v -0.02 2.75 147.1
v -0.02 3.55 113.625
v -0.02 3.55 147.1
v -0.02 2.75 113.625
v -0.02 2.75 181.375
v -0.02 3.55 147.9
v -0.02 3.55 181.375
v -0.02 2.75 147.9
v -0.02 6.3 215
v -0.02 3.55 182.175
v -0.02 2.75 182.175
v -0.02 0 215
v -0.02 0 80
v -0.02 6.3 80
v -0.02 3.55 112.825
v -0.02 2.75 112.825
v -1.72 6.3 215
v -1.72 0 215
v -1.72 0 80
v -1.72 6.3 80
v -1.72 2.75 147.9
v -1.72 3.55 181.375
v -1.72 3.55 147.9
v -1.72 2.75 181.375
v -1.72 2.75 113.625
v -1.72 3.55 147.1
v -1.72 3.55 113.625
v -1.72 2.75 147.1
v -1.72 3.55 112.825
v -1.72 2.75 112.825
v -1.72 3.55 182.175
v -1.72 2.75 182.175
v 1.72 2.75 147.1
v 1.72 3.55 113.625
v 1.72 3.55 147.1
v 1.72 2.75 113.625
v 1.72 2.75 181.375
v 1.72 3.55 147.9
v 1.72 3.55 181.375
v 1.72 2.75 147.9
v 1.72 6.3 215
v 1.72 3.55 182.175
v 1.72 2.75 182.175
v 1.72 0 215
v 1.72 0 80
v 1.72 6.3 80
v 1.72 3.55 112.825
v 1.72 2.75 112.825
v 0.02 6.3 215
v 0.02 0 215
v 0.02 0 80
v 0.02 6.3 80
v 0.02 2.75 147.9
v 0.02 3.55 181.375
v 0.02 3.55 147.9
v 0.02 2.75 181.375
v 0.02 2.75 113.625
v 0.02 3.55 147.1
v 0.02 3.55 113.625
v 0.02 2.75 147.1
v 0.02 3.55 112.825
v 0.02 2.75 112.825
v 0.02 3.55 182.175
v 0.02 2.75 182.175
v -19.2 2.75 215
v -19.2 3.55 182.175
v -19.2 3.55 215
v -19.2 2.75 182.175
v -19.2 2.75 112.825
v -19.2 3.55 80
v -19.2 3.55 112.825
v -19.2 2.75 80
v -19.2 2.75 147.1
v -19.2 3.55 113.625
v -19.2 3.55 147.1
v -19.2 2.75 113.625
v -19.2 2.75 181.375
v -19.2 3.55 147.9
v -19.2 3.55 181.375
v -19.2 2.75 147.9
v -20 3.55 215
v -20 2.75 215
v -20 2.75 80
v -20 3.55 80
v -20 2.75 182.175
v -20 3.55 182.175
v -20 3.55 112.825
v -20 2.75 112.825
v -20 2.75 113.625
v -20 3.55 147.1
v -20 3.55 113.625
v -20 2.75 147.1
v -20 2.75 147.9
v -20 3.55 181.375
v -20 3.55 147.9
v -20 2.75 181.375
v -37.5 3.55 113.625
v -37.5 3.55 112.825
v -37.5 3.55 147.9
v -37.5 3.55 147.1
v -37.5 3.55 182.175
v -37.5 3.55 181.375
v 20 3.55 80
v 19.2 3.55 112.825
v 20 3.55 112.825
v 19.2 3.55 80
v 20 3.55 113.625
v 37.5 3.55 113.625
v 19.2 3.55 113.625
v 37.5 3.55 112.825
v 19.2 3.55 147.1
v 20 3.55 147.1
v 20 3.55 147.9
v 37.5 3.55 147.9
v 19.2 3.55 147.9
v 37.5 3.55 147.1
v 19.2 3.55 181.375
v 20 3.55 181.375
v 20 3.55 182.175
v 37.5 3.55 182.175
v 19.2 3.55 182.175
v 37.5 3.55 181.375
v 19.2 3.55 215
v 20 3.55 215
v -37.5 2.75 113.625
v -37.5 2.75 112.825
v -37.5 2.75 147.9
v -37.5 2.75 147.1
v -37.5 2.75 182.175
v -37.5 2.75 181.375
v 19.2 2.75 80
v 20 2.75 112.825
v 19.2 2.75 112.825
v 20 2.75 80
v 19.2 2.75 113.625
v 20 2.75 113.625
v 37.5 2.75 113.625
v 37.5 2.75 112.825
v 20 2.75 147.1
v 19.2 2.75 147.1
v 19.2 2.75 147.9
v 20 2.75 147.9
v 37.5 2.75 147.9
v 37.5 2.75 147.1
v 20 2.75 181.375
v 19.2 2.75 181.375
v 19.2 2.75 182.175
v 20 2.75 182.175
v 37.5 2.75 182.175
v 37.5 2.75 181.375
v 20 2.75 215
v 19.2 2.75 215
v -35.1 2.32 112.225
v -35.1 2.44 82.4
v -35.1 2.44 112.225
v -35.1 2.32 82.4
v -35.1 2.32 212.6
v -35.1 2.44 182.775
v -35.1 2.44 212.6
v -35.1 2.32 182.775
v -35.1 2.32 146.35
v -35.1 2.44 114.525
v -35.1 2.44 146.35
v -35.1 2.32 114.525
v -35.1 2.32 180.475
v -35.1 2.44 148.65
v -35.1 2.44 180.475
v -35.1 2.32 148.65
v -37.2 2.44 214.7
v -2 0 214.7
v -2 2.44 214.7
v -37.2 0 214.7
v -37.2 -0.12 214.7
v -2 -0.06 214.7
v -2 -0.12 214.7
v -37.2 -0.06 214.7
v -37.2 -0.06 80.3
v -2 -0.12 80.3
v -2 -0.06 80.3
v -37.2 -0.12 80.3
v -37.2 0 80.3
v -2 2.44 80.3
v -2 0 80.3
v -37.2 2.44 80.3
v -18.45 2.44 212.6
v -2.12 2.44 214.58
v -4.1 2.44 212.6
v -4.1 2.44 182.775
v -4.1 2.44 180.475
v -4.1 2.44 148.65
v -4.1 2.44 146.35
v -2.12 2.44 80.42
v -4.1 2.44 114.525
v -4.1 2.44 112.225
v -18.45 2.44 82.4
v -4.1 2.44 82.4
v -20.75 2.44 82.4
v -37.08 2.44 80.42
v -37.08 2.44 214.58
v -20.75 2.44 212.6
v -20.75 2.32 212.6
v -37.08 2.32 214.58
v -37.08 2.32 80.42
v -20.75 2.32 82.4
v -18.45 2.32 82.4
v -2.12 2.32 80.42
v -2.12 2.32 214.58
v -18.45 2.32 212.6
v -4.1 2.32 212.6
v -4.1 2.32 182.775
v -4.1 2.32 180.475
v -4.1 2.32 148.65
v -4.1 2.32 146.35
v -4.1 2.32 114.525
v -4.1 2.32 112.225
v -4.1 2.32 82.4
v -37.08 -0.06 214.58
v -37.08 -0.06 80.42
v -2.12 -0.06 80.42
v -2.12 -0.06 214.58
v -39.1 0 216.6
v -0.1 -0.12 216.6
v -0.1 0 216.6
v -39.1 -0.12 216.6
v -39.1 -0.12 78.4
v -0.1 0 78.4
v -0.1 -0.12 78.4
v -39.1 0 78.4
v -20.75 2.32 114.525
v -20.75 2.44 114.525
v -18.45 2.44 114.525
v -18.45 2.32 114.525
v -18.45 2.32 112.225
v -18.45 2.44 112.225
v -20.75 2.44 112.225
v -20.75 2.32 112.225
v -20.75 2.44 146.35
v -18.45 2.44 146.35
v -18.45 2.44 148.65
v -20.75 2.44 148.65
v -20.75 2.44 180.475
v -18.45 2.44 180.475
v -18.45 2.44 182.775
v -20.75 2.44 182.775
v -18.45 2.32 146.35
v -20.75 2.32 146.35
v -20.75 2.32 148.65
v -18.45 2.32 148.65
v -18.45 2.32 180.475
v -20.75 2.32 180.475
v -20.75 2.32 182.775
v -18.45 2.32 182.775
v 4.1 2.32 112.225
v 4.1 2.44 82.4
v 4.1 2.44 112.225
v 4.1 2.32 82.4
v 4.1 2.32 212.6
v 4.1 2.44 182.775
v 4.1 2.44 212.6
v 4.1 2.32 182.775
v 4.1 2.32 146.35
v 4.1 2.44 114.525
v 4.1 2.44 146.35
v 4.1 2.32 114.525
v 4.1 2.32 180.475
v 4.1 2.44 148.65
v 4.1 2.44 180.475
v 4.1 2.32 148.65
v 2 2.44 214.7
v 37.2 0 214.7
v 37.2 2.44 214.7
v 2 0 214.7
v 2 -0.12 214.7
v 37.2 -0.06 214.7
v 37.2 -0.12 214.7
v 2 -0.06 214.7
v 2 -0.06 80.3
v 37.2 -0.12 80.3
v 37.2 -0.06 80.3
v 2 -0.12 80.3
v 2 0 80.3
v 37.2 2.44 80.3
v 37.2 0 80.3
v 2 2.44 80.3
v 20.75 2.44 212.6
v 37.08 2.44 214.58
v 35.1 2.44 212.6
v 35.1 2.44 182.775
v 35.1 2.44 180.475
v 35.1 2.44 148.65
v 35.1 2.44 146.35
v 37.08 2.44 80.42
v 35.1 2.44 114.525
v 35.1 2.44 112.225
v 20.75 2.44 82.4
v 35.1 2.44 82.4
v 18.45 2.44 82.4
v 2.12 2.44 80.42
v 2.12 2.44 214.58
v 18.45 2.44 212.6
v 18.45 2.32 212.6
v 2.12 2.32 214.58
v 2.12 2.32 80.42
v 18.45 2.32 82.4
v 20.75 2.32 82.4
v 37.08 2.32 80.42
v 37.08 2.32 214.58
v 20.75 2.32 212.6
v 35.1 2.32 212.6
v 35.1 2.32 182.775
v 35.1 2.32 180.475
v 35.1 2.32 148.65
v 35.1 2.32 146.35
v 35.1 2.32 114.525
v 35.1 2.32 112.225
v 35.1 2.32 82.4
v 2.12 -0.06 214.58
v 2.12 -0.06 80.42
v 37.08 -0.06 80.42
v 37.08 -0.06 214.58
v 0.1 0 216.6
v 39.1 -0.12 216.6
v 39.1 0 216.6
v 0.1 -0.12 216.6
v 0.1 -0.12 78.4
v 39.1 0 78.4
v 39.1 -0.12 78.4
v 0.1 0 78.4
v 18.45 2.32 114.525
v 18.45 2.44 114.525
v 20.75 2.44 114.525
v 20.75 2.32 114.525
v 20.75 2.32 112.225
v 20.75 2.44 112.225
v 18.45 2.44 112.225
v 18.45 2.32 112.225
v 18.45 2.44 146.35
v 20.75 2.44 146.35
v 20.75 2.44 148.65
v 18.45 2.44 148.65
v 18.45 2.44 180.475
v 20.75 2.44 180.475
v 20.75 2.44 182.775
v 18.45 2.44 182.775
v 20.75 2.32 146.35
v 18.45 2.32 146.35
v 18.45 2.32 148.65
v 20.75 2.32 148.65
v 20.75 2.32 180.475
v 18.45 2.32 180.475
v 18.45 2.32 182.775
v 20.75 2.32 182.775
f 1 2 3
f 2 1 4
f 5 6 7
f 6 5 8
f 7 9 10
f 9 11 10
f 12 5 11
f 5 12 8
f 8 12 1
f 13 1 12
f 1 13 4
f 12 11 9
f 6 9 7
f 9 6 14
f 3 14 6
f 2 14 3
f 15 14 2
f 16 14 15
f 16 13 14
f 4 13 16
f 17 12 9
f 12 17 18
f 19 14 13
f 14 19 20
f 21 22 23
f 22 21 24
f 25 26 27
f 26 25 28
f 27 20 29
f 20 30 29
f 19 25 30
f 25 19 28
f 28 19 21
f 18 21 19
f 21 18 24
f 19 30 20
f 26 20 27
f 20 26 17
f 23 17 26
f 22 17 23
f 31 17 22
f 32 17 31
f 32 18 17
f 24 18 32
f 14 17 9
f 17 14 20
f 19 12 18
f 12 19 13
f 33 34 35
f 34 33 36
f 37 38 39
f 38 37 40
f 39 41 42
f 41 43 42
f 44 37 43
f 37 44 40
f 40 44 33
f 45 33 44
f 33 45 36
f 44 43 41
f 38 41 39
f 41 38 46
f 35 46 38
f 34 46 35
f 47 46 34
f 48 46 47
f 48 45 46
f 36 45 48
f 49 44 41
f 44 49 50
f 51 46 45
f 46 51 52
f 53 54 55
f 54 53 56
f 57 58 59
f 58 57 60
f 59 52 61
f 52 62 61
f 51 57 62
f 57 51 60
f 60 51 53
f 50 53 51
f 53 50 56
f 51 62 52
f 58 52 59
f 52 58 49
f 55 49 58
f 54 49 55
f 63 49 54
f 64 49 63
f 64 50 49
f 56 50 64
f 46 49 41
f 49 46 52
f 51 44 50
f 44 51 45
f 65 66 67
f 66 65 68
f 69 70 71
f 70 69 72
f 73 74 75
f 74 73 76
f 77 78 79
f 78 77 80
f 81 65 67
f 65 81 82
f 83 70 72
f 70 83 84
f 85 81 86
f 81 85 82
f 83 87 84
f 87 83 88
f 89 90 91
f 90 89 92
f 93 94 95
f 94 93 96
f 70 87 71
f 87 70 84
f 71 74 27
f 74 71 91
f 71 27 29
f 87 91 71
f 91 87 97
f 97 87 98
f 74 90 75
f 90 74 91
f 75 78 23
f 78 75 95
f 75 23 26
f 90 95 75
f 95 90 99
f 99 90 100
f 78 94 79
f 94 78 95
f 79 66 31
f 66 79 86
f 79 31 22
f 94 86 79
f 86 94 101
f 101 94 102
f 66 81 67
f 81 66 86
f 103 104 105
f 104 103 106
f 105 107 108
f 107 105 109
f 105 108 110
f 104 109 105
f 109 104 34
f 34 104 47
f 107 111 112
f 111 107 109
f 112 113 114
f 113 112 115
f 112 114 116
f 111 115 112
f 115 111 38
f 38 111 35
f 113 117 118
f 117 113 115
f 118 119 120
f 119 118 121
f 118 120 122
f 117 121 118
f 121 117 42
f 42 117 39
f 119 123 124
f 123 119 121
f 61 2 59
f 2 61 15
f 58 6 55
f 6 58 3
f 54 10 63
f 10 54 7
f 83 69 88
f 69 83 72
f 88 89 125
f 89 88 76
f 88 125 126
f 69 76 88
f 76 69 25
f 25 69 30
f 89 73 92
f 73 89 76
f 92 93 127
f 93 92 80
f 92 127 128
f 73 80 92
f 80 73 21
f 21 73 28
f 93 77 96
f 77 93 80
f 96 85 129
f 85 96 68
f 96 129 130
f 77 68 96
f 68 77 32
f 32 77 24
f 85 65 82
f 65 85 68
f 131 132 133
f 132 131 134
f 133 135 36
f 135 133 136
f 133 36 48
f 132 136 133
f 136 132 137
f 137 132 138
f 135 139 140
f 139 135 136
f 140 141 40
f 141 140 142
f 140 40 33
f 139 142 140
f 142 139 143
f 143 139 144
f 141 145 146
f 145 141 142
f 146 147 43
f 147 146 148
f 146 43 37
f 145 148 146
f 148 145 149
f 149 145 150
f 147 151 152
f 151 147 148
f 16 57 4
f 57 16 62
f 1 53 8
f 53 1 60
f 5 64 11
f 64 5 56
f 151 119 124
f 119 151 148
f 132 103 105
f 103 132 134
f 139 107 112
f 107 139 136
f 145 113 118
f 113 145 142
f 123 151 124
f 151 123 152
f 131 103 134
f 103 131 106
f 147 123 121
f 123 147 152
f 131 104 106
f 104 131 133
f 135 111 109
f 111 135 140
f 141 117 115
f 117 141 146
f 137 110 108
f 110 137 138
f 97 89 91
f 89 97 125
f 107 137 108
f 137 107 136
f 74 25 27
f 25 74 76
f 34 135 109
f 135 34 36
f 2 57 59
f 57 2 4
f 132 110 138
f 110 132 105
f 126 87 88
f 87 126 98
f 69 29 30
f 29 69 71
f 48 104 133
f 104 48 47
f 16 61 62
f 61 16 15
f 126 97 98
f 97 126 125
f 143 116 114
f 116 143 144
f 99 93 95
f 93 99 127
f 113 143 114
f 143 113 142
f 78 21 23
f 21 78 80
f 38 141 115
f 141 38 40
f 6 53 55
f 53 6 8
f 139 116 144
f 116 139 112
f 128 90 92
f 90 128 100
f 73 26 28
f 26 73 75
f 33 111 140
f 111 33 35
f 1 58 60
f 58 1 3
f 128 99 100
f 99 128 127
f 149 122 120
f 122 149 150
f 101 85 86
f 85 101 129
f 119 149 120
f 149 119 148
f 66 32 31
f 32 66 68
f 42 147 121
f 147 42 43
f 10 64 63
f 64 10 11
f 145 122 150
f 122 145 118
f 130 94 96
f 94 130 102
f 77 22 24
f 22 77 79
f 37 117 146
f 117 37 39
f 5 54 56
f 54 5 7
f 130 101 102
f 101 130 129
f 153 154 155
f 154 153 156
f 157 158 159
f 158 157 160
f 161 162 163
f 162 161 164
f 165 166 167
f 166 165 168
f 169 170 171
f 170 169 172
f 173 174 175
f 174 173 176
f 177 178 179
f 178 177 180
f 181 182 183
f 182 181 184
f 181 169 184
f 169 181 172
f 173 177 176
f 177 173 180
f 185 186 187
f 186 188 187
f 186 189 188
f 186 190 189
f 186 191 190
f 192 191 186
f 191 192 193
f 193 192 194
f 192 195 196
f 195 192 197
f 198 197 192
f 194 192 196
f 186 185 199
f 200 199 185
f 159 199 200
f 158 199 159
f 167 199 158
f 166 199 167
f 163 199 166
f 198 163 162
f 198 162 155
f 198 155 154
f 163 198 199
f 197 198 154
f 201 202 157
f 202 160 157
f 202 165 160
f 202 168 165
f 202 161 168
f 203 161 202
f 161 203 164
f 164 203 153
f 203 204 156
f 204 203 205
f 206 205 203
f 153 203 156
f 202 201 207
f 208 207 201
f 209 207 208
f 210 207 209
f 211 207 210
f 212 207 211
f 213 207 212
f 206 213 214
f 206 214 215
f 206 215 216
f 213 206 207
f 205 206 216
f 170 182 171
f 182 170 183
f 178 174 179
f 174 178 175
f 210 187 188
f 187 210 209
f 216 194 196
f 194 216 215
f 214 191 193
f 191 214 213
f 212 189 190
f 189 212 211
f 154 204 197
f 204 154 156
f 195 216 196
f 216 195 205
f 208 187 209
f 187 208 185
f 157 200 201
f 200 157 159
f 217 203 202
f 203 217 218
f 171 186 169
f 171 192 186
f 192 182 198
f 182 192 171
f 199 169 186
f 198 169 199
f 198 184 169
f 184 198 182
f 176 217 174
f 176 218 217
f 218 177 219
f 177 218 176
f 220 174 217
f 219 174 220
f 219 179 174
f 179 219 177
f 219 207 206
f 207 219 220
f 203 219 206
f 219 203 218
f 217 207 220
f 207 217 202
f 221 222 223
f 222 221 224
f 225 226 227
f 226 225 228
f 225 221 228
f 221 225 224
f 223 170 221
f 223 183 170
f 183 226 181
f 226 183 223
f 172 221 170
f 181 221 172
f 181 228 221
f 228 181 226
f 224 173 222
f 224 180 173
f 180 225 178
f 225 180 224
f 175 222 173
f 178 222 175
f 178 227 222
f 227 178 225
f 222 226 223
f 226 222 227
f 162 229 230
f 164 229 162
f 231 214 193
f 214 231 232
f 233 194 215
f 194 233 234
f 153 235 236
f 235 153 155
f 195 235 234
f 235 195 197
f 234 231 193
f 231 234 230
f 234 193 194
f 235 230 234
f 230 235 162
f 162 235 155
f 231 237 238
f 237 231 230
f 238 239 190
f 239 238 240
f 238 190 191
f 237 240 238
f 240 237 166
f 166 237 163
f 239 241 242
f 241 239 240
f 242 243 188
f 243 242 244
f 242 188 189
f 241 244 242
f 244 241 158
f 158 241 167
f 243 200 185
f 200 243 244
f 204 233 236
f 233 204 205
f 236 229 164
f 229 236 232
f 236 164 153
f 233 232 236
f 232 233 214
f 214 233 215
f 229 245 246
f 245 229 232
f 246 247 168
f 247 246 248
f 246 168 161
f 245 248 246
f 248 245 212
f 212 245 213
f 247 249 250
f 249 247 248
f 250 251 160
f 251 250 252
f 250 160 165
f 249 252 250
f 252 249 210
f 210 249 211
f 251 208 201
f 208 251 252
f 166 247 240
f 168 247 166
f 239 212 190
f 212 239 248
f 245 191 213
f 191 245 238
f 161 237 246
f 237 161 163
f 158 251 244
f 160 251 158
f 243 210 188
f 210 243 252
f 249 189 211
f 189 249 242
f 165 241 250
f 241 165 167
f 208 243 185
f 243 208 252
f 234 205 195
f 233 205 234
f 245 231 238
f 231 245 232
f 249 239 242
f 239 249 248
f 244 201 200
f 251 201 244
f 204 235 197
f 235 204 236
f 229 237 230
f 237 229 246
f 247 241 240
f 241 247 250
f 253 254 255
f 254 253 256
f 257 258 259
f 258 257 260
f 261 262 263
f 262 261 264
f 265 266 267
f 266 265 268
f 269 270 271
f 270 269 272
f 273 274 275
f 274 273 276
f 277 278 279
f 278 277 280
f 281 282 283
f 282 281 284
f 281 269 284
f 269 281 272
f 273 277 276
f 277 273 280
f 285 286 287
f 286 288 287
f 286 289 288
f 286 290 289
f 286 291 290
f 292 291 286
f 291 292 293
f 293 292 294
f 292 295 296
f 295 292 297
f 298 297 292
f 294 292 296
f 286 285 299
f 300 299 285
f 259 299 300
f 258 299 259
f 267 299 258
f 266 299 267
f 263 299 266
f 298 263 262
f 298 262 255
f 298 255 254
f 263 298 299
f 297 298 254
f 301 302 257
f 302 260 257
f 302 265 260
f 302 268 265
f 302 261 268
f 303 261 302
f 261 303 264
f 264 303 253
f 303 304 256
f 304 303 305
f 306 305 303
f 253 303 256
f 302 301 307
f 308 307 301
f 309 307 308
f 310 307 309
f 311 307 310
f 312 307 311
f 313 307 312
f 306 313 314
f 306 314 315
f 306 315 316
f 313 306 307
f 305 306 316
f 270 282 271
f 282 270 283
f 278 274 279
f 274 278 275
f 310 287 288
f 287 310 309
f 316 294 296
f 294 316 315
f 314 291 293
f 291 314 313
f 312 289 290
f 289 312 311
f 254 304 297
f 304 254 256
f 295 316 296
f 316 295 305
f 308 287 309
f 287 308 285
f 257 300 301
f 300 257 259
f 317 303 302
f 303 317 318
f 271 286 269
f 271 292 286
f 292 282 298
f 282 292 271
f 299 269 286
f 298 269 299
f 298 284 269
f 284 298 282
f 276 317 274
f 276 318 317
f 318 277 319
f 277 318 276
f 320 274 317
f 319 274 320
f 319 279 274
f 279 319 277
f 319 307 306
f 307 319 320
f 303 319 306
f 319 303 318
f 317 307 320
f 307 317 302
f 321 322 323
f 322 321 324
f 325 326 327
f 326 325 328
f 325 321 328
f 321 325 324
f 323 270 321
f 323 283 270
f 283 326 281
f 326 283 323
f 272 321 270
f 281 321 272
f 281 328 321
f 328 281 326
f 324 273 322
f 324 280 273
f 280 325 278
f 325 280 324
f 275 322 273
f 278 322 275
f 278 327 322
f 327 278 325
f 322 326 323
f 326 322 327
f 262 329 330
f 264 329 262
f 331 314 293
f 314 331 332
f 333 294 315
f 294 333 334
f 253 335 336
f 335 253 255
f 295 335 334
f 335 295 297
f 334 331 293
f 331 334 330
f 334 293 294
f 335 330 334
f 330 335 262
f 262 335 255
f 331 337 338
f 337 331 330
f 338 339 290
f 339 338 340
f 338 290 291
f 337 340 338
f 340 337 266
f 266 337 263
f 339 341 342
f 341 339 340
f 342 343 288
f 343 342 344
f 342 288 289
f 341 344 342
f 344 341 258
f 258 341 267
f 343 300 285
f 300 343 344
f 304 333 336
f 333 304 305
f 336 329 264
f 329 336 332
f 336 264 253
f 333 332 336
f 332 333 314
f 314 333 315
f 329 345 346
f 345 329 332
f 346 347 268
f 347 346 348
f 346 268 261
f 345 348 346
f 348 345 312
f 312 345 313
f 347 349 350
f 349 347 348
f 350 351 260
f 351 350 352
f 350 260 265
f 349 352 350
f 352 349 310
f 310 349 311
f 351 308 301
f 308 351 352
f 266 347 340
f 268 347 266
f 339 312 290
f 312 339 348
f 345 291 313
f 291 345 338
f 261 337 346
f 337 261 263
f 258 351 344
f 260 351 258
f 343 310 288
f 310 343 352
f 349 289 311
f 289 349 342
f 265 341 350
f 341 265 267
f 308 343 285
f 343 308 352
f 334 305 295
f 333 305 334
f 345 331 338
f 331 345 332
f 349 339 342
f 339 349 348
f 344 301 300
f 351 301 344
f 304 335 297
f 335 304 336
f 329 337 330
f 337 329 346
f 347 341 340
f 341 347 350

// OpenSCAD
// If high_windows is false, the ready Thailand metal frame
// size is used. If windows are made by ourselves, the
// high_windows can be set to true to get bigger windows.
high_windows = true;

std_window_w = high_windows ? 75 : 70;
std_window_h = high_windows ? 135 : 110;
std_window_hatches = 2;
std_window_pos = high_windows ? 80 : 90;
std_nro_vertical_squares = 4;

wide_window_w = 2 * std_window_w;
wide_window_h = std_window_h;
wide_window_hatches = 4;

small_window_w = high_windows ? 60 : 50;
small_window_h = small_window_w;
small_window_hatches = 2;
small_window_pos = std_window_pos + std_window_h - small_window_h;
small_nro_vertical_squares = 2;

small_bar_d = 0.8;
separator_bar_w = 1.7;
separator_bar_d = 6.3;

glass_frame_w = 2.1;
glass_divider_w = 2.3;
glass_frame_t = 0.12;
glass_frame_d = 2.5;
glass_frame_flap_w = 1.9;


allowance = 0.3;
hinge_dx = 1;
hinge_dy = 3;
window_frame_color1 = [0.4, 0.2, 0.2, 1.0];
window_frame_color2 = [0.5, 0.3, 0.3, 1.0];
window_frame_color3 = [0.3, 0.4, 0.3, 1.0];

module std_window(wall_thickness=15, open_angle=0, window_pos = std_window_pos)
{
    translate([0,0,window_pos])
    window(wall_thickness, open_angle, 
        std_window_w, std_window_h, 
        std_window_hatches, 
        std_nro_vertical_squares);
}

module std_window_hole(wall_thickness=15, window_pos = std_window_pos)
{
    translate([0,wall_thickness/2,window_pos+std_window_h/2])
    color("white")
    cube([std_window_w, wall_thickness+1.0, std_window_h],center=true);
}

module wide_window(wall_thickness=15, open_angle=0, window_pos = std_window_pos)
{
    translate([0,0,window_pos])
    window(wall_thickness, open_angle, 
        wide_window_w, wide_window_h, 
        wide_window_hatches, 
        std_nro_vertical_squares);
}

module wide_window_hole(wall_thickness=15, window_pos = std_window_pos)
{
    translate([0,wall_thickness/2,window_pos+wide_window_h/2])
    color("white")
    cube([wide_window_w, wall_thickness+1.0, wide_window_h],center=true);
}

module small_window(wall_thickness=15, open_angle=0, window_pos = small_window_pos)
{
    translate([0,0,window_pos])
    window(wall_thickness, open_angle, 
        small_window_w, small_window_h, 
        small_window_hatches, small_nro_vertical_squares);
}

module small_window_hole(wall_thickness=15, window_pos = small_window_pos)
{
    translate([0,wall_thickness/2,window_pos+small_window_h/2])
    color("white")
    cube([small_window_w, wall_thickness+1.0, small_window_h],center=true);
}

module window(wall_thickness=15, open_angle=0, width=std_window_w, height=std_window_h, nro_openings = std_window_hatches,
    nro_vertical_squares=std_nro_vertical_squares) 
{
    fixedgrid(width, height, nro_openings, nro_vertical_squares); 
    
    hatch_w = (width - (2*nro_openings-2)*separator_bar_w)/nro_openings - 2 * allowance;
    hatch_h = height - 2 * allowance; 
    step_x = (width+2*separator_bar_w) / nro_openings;
    for (i = [0:nro_openings-1])
    {
        x = step_x * (i - nro_openings/2 + 0.5);

        translate([x, 0, height/2]) 
        windowhatch(hatch_w, hatch_h, open_angle, i,
            nro_vertical_squares); 
    }
}

module fixedgrid(width, height, nro_openings, nro_vertical_squares) 
{
    step_x = (width+2*separator_bar_w) / nro_openings;
    for (i = [nro_openings/-2+1:nro_openings/2-1])
    {
        x = step_x * i;
        color(window_frame_color1) 
        translate([x - separator_bar_w/2-0.02, 
            separator_bar_d/2, height/2]) 
        cube([separator_bar_w, separator_bar_d, height],
                center=true);
            
        color(window_frame_color2) 
        translate([x + separator_bar_w/2+0.02, 
            separator_bar_d/2, height/2]) 
        cube([separator_bar_w, separator_bar_d, height],
            center=true);
   }
   
   for (i = [0:nro_openings-1])
   {
       x = step_x * (i - nro_openings/2 + 0.5);

       color(window_frame_color2) 
       translate([x, separator_bar_d/2, height/2]) 
       cube([small_bar_d, small_bar_d, height],
           center=true);
   }
   
   step_y = (height+glass_frame_w) / nro_vertical_squares;
   for (i = [nro_vertical_squares/-2+1:nro_vertical_squares/2-1])
   {
       y = step_y * i + height/2;

       color(window_frame_color1) 
       translate([0, separator_bar_d/2, y]) 
       cube([width, small_bar_d, small_bar_d],
           center=true);
   }   
}

module windowhatch(width=70, height=110, open_angle=0, step=0, nro_vertical_squares=std_nro_vertical_squares) 
{
    dx = step%2 == 0 ? width/2 + hinge_dx : -width/2 - hinge_dx;
    dy = hinge_dy;
    translate([-dx, -dy, 0])
    rotate([0,0, step%2 == 0 ? -open_angle : open_angle])
    translate([dx, dy, 0])
    {
        color(window_frame_color2)
        translate([0, (glass_frame_d-glass_frame_t), 0])
        genericframe(width, height, glass_frame_w, glass_frame_t);
        
        color(window_frame_color3)
        translate([0, (glass_frame_d-glass_frame_t)/2, 0])
        genericframe(width, height, glass_frame_t, glass_frame_d);

        color(window_frame_color2)
        translate([0, glass_frame_t/-2, 0])
        genericframe(width+2*glass_frame_flap_w, height+2*glass_frame_flap_w, glass_frame_flap_w, glass_frame_t);
        
        color(window_frame_color1) 
        translate([0, (glass_frame_d-glass_frame_t), 0])
        cube([glass_divider_w, glass_frame_t, 
            height-2*glass_frame_w], center=true);
        
        step_y = (height+glass_frame_w) / nro_vertical_squares;
        for (i = [nro_vertical_squares/-2+1:nro_vertical_squares/2-1])
        {
           y = step_y * i;

           color(window_frame_color1) 
           translate([0, (glass_frame_d-glass_frame_t), y]) 
           cube([width-2*glass_frame_w, glass_frame_t, glass_divider_w],
               center=true);
       }   
   }
} 


module genericframe(width=70, height=110, profile_width = 5, profile_depth = 8) 
{
    translate([-(width - profile_width)/2, 0, 0]) 
    cube([profile_width,profile_depth, height], center=true);
    
    translate([(width - profile_width)/2, 0, 0]) 
    cube([profile_width,profile_depth, height], center=true);

    translate([0, 0, -(height - profile_width)/2]) 
    cube([width, profile_depth, profile_width], center=true);

    translate([0, 0, (height - profile_width)/2]) 
    cube([width, profile_depth, profile_width], center=true);
}    

// For testing
std_window(15, $t*179);
